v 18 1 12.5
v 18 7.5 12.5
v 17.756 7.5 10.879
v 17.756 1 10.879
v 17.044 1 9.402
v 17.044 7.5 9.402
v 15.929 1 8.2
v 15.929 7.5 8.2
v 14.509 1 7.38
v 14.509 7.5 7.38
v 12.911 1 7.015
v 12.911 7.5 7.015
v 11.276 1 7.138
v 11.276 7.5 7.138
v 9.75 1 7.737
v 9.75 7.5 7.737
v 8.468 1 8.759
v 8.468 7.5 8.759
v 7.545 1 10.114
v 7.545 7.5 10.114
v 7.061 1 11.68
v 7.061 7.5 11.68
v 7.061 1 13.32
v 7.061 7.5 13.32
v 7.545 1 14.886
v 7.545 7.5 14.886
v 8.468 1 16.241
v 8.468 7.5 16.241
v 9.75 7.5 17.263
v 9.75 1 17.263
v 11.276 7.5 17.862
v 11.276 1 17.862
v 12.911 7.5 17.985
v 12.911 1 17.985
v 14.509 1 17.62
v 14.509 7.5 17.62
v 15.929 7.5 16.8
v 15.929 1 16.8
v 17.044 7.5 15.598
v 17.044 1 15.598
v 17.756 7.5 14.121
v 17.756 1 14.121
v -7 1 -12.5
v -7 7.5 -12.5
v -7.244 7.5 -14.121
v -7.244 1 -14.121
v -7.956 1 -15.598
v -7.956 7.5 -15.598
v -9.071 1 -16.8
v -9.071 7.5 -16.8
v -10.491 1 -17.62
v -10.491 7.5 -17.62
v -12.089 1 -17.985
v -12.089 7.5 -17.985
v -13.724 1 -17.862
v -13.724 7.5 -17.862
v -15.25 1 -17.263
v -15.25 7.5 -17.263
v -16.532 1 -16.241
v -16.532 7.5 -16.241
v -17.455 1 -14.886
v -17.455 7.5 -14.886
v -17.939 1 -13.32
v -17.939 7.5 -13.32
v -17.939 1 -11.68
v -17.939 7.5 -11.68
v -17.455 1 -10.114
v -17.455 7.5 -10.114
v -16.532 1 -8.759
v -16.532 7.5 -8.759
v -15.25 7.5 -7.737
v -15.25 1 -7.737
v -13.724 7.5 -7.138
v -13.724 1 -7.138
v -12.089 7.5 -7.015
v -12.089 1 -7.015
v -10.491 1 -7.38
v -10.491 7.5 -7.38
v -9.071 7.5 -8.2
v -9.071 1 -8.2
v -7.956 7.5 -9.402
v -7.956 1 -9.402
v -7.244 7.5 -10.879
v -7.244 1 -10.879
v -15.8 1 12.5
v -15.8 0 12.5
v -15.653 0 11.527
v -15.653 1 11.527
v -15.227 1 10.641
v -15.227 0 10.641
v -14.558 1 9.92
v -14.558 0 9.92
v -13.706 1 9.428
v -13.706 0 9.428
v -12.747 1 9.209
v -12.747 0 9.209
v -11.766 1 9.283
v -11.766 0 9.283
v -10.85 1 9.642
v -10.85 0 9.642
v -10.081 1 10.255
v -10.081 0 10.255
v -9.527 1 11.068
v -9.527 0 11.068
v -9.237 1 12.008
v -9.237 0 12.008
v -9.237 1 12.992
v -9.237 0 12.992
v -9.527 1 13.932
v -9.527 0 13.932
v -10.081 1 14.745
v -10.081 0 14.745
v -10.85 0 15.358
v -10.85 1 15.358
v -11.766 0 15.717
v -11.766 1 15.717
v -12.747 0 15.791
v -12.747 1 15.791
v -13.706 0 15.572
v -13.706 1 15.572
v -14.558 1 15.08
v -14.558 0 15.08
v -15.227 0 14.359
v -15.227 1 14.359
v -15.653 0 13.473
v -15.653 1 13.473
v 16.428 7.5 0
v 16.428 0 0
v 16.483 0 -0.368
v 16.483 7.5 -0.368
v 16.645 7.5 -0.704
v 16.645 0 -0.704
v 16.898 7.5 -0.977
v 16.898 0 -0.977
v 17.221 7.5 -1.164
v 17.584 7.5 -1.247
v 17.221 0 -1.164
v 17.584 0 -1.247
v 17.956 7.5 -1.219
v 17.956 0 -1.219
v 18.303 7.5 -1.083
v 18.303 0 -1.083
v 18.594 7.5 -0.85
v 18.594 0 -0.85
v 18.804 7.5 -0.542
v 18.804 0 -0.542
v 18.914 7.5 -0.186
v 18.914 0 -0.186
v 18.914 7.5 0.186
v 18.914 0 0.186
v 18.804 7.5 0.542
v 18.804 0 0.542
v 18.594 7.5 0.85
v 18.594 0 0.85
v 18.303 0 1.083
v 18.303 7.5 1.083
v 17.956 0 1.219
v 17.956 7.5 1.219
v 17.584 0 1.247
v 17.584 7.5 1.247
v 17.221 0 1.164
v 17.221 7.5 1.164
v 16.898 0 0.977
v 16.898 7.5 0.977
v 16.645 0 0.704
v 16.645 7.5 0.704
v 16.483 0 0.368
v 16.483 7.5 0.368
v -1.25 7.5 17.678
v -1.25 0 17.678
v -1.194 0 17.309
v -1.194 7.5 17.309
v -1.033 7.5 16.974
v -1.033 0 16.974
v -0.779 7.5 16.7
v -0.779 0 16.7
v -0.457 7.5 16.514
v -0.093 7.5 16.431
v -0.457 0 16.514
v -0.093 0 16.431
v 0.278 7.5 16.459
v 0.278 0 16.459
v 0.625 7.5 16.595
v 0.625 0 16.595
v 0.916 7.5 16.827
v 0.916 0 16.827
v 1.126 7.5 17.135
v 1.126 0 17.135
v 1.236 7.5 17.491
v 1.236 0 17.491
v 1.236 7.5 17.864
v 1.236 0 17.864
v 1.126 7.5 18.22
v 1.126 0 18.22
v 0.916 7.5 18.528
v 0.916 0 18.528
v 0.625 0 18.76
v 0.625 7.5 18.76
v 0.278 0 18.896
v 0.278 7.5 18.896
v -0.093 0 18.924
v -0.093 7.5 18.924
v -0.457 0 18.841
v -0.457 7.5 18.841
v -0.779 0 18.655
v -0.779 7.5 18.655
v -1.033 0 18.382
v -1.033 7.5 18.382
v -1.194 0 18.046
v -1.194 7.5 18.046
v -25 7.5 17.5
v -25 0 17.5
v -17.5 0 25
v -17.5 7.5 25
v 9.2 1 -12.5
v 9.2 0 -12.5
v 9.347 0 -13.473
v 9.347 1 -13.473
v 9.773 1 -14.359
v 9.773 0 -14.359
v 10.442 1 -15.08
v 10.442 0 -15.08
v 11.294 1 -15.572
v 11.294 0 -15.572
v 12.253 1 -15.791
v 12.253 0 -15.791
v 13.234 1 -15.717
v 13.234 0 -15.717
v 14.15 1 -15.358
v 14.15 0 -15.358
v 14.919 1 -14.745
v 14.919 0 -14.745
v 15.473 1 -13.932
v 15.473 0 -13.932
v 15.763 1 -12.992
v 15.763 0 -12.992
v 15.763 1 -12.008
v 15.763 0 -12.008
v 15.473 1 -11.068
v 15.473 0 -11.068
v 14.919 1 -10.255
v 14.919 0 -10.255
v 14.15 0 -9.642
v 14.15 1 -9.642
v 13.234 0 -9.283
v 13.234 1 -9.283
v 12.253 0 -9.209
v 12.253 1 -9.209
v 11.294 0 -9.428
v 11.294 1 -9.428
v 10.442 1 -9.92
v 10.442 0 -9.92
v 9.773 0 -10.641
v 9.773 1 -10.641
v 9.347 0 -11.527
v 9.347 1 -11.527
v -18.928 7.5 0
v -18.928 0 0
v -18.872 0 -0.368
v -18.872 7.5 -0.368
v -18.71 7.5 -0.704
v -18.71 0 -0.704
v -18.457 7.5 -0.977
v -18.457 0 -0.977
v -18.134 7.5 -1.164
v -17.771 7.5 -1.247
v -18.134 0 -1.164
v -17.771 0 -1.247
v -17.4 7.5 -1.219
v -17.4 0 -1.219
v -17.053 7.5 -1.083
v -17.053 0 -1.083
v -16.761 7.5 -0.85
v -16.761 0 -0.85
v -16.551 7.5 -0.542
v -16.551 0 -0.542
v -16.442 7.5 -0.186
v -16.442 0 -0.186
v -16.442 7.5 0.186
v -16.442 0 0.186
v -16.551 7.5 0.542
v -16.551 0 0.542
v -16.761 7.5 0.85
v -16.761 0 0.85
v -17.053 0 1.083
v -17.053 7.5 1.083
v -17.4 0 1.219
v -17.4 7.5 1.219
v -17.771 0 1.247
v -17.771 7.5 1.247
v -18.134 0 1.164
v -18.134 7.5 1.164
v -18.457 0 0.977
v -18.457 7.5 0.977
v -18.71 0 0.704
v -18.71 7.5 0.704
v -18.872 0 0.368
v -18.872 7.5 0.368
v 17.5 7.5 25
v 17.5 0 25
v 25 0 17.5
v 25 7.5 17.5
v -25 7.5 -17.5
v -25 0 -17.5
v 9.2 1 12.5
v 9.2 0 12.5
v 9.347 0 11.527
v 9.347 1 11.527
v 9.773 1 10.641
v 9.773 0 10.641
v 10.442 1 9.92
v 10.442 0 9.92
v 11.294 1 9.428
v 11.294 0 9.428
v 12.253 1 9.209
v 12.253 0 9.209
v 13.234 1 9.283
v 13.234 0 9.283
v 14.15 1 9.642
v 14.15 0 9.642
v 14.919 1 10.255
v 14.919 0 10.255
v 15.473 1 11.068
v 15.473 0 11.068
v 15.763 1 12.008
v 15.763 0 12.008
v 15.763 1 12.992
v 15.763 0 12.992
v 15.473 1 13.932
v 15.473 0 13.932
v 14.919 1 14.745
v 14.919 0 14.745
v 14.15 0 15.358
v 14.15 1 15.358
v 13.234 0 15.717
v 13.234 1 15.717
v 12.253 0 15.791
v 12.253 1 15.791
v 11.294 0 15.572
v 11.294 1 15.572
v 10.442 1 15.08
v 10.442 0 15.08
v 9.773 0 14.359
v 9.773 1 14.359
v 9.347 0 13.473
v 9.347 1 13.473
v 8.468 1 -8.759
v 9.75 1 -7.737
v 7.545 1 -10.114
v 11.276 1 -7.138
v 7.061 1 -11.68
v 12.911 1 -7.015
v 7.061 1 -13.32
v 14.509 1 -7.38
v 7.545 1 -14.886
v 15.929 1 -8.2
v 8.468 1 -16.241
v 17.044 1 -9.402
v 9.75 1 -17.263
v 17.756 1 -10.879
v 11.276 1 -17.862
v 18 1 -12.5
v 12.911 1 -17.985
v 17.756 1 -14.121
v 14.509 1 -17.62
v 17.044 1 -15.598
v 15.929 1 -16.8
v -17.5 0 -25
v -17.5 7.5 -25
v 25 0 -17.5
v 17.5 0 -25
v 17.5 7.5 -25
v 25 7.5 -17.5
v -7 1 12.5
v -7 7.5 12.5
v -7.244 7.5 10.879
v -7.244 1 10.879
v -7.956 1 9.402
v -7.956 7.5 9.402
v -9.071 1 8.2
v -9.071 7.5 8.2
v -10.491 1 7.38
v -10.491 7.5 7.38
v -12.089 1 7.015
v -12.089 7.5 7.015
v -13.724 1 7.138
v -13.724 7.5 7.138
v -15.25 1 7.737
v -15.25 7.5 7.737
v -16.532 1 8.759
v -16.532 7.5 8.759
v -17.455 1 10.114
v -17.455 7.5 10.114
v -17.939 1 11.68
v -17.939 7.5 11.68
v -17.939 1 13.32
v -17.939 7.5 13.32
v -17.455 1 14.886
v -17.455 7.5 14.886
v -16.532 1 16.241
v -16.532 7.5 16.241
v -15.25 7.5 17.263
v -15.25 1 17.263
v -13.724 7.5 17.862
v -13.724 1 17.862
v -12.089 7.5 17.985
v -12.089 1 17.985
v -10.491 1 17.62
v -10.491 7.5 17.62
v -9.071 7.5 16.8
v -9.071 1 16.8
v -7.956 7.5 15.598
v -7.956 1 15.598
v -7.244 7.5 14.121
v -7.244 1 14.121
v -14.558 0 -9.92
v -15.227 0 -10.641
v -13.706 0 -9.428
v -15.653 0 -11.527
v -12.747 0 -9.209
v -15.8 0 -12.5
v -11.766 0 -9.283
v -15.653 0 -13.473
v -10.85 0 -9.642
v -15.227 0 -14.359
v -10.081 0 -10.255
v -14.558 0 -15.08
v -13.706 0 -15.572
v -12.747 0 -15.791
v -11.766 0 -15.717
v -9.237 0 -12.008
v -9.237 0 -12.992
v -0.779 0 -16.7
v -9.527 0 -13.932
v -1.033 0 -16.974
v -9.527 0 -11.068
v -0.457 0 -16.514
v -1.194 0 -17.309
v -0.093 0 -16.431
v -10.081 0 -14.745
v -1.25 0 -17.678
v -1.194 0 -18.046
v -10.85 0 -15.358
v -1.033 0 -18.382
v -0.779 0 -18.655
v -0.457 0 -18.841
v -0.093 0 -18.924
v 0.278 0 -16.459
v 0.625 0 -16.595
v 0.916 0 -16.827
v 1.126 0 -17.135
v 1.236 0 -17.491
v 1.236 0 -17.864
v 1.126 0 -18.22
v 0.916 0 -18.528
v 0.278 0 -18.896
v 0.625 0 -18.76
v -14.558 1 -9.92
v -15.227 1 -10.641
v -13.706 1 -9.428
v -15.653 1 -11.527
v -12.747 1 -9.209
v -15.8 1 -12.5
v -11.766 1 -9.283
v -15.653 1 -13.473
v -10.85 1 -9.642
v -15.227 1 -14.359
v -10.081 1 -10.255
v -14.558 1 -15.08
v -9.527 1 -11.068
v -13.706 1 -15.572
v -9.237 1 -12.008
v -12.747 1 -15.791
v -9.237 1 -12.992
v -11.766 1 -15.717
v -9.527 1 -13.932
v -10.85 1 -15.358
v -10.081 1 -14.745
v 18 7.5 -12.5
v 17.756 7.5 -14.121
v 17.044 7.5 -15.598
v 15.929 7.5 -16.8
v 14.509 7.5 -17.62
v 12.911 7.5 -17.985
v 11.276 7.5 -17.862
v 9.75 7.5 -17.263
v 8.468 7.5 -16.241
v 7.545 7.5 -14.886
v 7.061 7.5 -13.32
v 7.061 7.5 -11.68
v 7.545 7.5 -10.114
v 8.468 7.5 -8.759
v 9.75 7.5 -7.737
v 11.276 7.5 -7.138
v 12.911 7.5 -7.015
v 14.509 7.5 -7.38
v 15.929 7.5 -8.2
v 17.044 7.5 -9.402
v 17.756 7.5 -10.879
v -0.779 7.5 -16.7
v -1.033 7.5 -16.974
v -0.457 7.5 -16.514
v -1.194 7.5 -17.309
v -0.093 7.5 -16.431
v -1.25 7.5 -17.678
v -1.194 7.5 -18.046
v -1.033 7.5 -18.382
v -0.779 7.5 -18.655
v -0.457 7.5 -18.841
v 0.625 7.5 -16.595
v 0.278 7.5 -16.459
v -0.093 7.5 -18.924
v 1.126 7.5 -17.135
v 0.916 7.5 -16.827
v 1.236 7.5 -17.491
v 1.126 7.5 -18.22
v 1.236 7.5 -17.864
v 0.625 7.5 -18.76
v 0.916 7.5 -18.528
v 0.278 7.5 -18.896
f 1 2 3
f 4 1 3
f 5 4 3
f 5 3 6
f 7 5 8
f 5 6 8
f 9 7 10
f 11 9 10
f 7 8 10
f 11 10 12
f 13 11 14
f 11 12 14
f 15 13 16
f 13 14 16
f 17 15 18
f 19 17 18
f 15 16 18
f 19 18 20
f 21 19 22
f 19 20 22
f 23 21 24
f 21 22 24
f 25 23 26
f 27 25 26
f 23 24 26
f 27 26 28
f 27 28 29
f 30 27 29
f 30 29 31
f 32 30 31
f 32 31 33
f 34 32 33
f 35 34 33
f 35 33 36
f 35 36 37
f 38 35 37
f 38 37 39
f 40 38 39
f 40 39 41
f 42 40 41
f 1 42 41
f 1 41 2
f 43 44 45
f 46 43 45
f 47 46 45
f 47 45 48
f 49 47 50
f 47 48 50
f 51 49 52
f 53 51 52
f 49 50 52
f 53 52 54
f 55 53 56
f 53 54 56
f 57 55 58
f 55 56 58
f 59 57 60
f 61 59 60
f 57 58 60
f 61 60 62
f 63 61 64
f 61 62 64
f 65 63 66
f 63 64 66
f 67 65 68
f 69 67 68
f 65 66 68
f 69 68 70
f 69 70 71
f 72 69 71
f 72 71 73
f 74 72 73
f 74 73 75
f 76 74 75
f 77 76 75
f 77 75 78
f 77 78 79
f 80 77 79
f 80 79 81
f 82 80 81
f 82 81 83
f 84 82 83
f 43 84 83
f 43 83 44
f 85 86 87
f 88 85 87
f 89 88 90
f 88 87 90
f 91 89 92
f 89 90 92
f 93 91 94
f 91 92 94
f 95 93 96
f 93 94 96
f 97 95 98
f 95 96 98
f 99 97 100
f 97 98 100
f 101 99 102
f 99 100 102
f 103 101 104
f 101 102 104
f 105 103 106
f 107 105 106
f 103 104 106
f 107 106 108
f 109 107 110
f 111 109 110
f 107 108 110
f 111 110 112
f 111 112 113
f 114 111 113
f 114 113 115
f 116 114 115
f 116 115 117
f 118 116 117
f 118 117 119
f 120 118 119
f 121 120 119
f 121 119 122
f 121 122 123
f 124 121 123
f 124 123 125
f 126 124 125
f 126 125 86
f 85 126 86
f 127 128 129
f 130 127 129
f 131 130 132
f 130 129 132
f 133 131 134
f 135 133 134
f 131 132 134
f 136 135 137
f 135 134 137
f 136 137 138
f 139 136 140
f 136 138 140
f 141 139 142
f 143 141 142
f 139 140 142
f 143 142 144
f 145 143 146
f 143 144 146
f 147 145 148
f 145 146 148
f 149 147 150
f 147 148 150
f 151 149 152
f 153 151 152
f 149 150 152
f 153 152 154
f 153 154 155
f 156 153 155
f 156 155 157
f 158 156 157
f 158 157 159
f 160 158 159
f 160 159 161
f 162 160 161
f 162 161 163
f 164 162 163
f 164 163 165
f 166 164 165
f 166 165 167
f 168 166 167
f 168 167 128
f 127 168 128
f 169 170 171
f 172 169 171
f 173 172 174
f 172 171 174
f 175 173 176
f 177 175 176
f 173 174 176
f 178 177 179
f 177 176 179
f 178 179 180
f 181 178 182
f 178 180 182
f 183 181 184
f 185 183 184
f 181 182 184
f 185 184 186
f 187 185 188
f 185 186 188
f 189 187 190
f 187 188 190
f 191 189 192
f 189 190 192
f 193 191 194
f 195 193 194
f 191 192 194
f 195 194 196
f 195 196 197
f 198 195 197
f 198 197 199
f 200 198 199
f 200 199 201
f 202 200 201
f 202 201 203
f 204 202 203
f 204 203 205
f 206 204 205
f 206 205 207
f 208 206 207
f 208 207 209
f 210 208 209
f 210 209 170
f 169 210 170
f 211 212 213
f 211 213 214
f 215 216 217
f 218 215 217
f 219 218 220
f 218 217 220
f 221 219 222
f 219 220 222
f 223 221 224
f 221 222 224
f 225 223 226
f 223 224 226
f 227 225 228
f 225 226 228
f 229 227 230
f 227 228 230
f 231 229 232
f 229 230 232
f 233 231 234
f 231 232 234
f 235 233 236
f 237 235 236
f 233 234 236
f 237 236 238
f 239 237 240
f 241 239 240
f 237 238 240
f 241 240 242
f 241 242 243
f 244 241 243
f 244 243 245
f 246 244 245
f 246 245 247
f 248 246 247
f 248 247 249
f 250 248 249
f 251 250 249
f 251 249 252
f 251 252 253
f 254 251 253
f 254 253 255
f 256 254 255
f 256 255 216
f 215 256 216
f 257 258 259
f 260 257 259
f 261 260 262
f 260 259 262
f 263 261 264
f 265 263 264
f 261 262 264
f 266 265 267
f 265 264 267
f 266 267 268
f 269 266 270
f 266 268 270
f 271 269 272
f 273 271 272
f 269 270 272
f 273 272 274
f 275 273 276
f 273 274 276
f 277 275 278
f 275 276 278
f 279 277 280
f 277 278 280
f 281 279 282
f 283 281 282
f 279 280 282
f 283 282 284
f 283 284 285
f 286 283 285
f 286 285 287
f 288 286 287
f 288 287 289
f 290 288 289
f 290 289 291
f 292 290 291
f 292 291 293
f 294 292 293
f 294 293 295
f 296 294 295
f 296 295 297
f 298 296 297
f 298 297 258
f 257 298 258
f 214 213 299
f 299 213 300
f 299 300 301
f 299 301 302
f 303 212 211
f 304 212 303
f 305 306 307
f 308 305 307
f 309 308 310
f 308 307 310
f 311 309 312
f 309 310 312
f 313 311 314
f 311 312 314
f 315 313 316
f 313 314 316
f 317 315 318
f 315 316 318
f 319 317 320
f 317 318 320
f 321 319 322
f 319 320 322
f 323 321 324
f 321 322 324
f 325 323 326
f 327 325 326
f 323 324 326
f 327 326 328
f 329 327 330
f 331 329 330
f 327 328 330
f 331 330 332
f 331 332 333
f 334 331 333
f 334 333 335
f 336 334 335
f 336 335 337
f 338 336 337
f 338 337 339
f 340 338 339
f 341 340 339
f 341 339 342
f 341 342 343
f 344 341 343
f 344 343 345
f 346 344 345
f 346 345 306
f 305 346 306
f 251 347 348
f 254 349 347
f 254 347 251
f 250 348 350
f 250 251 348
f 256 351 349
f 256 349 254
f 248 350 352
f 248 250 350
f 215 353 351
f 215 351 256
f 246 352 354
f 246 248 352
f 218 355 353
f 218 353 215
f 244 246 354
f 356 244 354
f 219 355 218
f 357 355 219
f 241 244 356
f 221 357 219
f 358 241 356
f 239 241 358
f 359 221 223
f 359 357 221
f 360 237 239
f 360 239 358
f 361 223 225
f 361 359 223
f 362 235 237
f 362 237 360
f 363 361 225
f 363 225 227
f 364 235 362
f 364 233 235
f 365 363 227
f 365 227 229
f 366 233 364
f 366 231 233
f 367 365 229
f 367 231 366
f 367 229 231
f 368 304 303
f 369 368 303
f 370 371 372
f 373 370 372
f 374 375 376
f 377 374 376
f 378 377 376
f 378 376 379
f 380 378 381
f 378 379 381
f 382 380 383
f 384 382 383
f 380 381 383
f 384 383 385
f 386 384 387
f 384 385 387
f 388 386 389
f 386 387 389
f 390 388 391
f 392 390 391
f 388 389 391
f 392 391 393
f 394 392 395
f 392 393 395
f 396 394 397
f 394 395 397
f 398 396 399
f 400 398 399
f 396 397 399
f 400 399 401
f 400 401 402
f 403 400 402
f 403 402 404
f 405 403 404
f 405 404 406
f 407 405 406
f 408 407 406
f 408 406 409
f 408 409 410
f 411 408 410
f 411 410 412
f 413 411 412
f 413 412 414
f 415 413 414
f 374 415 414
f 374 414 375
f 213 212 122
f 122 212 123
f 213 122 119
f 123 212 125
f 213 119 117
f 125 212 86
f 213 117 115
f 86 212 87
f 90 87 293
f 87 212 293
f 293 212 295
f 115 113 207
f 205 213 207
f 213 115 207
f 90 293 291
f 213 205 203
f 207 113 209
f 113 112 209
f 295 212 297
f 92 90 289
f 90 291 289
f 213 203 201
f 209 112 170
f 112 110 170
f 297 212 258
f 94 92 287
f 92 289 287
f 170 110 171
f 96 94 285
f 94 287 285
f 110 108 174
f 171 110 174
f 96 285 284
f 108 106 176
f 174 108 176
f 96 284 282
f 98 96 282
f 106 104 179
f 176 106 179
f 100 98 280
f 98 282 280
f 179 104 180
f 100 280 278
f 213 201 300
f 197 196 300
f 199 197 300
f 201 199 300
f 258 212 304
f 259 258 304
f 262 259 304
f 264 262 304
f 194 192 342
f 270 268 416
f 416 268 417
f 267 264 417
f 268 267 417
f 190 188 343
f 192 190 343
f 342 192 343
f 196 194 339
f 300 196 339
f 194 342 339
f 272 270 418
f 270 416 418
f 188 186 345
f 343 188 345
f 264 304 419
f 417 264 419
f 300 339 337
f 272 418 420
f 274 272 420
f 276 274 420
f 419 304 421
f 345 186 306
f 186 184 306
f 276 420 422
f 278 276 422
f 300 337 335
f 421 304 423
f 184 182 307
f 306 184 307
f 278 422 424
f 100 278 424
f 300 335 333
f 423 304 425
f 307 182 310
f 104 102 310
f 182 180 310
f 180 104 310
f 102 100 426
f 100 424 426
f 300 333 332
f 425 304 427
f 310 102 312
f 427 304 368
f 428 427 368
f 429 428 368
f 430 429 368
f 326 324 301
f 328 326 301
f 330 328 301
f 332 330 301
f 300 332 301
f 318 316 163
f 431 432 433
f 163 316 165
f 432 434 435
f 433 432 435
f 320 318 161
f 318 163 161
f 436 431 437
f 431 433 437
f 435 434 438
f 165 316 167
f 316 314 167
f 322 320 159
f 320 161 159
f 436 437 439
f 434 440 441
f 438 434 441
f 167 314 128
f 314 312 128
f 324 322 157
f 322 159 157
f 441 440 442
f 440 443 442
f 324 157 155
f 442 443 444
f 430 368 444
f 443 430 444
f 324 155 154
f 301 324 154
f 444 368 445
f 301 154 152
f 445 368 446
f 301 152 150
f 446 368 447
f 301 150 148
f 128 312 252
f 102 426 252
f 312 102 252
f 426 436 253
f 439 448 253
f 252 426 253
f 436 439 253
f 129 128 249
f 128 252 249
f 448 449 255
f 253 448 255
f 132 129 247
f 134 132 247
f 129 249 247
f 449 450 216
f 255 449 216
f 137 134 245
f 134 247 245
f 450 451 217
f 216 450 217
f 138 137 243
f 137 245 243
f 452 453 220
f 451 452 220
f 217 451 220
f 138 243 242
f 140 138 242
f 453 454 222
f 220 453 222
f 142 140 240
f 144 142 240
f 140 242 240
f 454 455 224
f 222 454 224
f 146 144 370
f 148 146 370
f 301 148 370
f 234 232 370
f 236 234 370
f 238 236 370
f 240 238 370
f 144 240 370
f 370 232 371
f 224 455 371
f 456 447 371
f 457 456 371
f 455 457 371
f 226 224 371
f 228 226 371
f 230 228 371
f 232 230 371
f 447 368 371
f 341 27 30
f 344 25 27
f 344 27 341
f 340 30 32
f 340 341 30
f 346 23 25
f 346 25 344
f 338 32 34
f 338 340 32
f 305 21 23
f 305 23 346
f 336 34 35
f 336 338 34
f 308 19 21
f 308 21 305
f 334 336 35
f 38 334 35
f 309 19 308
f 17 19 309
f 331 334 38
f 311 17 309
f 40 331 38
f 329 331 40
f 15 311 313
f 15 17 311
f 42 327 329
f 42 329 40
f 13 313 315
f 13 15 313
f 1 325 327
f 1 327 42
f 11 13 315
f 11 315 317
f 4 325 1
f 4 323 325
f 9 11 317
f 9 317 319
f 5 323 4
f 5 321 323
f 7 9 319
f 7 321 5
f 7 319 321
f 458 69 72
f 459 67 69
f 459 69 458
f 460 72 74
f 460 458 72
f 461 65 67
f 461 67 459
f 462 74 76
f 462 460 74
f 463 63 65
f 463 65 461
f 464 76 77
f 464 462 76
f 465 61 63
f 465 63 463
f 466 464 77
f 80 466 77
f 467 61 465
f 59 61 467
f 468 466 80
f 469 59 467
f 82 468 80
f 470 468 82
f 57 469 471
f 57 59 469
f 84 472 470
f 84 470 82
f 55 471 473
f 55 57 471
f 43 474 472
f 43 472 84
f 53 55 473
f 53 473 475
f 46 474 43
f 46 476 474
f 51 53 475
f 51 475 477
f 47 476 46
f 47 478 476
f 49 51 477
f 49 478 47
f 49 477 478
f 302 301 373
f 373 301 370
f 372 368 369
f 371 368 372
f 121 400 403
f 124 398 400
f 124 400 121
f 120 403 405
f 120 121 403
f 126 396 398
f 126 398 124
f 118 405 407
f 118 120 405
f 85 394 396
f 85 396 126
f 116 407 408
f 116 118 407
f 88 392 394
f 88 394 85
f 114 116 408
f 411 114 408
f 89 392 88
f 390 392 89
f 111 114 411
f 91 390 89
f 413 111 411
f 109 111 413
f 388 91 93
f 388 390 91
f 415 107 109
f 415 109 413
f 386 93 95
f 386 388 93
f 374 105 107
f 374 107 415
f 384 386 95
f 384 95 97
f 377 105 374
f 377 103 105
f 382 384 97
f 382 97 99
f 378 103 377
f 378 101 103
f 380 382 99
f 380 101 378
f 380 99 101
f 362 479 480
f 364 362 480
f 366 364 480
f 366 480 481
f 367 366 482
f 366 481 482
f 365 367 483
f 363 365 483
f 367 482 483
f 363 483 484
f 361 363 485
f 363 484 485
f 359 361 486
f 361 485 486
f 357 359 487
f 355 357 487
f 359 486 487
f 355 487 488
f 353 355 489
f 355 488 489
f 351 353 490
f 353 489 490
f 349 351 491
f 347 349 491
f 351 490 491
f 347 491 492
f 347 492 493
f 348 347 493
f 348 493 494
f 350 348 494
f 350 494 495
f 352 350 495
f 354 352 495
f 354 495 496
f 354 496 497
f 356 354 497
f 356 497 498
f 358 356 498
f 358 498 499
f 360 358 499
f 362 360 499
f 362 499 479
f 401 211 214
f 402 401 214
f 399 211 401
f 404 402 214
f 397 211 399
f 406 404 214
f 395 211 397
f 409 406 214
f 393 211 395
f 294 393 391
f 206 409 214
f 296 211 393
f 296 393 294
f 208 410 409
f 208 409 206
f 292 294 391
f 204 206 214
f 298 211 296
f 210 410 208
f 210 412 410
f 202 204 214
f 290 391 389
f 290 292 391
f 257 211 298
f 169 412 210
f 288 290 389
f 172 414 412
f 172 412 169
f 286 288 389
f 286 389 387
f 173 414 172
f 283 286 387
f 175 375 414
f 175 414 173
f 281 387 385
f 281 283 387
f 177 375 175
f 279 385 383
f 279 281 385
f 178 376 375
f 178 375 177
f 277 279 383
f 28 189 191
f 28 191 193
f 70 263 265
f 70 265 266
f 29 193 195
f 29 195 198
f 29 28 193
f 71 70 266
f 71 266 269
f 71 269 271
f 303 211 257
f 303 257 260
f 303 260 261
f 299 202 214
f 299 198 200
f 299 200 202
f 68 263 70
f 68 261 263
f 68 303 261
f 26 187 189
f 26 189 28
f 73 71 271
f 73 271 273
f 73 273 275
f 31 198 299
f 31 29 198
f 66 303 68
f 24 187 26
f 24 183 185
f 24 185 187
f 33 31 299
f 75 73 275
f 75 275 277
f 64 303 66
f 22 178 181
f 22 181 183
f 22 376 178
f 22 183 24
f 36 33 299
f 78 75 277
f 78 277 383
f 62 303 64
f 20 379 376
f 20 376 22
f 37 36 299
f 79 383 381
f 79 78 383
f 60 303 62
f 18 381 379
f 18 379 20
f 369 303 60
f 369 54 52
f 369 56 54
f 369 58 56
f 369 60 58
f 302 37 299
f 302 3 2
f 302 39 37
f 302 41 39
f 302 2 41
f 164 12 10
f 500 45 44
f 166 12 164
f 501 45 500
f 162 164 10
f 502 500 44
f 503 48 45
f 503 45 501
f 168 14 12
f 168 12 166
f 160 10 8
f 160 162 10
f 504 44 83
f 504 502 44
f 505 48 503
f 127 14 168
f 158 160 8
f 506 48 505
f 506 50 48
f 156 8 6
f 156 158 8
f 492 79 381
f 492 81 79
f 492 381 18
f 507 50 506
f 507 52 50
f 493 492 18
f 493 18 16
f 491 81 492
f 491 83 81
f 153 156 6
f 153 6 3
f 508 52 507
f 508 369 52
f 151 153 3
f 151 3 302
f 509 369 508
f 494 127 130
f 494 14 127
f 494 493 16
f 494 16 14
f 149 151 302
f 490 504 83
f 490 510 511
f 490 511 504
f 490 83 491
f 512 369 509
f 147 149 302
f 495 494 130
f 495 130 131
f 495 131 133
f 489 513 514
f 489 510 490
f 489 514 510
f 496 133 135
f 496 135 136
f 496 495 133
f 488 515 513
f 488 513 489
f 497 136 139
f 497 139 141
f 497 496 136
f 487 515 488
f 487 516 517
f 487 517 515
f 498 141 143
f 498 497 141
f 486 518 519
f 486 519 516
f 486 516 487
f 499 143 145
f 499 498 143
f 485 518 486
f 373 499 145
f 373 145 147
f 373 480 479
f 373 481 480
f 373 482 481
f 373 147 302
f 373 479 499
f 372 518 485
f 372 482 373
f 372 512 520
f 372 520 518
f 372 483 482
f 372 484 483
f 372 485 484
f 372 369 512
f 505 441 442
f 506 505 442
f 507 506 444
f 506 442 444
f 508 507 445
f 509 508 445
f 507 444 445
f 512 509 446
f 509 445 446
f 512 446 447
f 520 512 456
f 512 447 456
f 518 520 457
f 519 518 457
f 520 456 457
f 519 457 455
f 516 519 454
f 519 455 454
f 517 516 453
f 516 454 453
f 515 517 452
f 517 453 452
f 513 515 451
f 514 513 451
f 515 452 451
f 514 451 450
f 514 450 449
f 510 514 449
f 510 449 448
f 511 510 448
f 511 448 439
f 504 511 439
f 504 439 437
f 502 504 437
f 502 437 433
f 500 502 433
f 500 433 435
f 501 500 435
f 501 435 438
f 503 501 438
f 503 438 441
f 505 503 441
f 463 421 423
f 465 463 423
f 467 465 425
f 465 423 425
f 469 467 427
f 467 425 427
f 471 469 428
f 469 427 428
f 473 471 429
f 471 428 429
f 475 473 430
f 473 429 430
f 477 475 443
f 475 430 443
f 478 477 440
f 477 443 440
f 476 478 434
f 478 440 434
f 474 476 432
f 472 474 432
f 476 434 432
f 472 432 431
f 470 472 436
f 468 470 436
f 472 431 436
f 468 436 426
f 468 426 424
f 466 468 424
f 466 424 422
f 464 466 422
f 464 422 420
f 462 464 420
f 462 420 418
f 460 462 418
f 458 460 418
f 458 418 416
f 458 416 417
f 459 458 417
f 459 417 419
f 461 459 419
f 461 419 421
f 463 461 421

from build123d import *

# Parameters (mm, degrees)
SKETCH1_W                                           = 50
SKETCH1_H                                           = 50
BOSS_EXTRUDE1_DEPTH                                 = 7.5
CBORE_FOR_M6_HEX_SOCKET_HEAD_CAP_SCREW1_D           = 6.6
CBORE_FOR_M6_HEX_SOCKET_HEAD_CAP_SCREW1_DEPTH       = 7.5
CBORE_FOR_M6_HEX_SOCKET_HEAD_CAP_SCREW1_CBORE_D     = 11
CBORE_FOR_M6_HEX_SOCKET_HEAD_CAP_SCREW1_CBORE_DEPTH = 6.5
M3_TAPPED_HOLE1_D                                   = 2.5
M3_TAPPED_HOLE1_DEPTH                               = 7.5
CHAMFER1_SIZE                                       = 7.5


with BuildPart() as part:
    # Sketch1 → Boss-Extrude1 (new body)
    with BuildSketch(Plane(origin=(0, 0, 0), x_dir=(1, 0, 0), z_dir=(0, 1, 0))):
        Rectangle(SKETCH1_W, SKETCH1_H)
    extrude(amount=BOSS_EXTRUDE1_DEPTH)

    # CBORE for M6 Hex Socket Head Cap Screw1
    with Locations(Plane(origin=(0, 7.5, 0), x_dir=(1, 0, 0), z_dir=(0, 1, 0))):
        with Locations((-12.5, -12.5), (-12.5, 12.5), (12.5, 12.5), (12.5, -12.5)):
            CounterBoreHole(CBORE_FOR_M6_HEX_SOCKET_HEAD_CAP_SCREW1_D / 2, CBORE_FOR_M6_HEX_SOCKET_HEAD_CAP_SCREW1_CBORE_D / 2, CBORE_FOR_M6_HEX_SOCKET_HEAD_CAP_SCREW1_CBORE_DEPTH, depth=CBORE_FOR_M6_HEX_SOCKET_HEAD_CAP_SCREW1_DEPTH)

    # M3 Tapped Hole1
    with Locations(Plane(origin=(0, 7.5, 0), x_dir=(1, 0, 0), z_dir=(0, 1, 0))):
        with Locations((0, 17.67766953), (-17.67766953, 0), (0, -17.67766953), (17.67766953, 0)):
            Hole(M3_TAPPED_HOLE1_D / 2, depth=M3_TAPPED_HOLE1_DEPTH)

    # Chamfer1
    chamfer1_edges = [part.edges().sort_by_distance(p)[0] for p in [
        (25, 3.75, 25),
        (-25, 3.75, 25),
        (-25, 3.75, -25),
        (25, 3.75, -25),
    ]]
    chamfer(chamfer1_edges, length=CHAMFER1_SIZE)


solid = part.part
